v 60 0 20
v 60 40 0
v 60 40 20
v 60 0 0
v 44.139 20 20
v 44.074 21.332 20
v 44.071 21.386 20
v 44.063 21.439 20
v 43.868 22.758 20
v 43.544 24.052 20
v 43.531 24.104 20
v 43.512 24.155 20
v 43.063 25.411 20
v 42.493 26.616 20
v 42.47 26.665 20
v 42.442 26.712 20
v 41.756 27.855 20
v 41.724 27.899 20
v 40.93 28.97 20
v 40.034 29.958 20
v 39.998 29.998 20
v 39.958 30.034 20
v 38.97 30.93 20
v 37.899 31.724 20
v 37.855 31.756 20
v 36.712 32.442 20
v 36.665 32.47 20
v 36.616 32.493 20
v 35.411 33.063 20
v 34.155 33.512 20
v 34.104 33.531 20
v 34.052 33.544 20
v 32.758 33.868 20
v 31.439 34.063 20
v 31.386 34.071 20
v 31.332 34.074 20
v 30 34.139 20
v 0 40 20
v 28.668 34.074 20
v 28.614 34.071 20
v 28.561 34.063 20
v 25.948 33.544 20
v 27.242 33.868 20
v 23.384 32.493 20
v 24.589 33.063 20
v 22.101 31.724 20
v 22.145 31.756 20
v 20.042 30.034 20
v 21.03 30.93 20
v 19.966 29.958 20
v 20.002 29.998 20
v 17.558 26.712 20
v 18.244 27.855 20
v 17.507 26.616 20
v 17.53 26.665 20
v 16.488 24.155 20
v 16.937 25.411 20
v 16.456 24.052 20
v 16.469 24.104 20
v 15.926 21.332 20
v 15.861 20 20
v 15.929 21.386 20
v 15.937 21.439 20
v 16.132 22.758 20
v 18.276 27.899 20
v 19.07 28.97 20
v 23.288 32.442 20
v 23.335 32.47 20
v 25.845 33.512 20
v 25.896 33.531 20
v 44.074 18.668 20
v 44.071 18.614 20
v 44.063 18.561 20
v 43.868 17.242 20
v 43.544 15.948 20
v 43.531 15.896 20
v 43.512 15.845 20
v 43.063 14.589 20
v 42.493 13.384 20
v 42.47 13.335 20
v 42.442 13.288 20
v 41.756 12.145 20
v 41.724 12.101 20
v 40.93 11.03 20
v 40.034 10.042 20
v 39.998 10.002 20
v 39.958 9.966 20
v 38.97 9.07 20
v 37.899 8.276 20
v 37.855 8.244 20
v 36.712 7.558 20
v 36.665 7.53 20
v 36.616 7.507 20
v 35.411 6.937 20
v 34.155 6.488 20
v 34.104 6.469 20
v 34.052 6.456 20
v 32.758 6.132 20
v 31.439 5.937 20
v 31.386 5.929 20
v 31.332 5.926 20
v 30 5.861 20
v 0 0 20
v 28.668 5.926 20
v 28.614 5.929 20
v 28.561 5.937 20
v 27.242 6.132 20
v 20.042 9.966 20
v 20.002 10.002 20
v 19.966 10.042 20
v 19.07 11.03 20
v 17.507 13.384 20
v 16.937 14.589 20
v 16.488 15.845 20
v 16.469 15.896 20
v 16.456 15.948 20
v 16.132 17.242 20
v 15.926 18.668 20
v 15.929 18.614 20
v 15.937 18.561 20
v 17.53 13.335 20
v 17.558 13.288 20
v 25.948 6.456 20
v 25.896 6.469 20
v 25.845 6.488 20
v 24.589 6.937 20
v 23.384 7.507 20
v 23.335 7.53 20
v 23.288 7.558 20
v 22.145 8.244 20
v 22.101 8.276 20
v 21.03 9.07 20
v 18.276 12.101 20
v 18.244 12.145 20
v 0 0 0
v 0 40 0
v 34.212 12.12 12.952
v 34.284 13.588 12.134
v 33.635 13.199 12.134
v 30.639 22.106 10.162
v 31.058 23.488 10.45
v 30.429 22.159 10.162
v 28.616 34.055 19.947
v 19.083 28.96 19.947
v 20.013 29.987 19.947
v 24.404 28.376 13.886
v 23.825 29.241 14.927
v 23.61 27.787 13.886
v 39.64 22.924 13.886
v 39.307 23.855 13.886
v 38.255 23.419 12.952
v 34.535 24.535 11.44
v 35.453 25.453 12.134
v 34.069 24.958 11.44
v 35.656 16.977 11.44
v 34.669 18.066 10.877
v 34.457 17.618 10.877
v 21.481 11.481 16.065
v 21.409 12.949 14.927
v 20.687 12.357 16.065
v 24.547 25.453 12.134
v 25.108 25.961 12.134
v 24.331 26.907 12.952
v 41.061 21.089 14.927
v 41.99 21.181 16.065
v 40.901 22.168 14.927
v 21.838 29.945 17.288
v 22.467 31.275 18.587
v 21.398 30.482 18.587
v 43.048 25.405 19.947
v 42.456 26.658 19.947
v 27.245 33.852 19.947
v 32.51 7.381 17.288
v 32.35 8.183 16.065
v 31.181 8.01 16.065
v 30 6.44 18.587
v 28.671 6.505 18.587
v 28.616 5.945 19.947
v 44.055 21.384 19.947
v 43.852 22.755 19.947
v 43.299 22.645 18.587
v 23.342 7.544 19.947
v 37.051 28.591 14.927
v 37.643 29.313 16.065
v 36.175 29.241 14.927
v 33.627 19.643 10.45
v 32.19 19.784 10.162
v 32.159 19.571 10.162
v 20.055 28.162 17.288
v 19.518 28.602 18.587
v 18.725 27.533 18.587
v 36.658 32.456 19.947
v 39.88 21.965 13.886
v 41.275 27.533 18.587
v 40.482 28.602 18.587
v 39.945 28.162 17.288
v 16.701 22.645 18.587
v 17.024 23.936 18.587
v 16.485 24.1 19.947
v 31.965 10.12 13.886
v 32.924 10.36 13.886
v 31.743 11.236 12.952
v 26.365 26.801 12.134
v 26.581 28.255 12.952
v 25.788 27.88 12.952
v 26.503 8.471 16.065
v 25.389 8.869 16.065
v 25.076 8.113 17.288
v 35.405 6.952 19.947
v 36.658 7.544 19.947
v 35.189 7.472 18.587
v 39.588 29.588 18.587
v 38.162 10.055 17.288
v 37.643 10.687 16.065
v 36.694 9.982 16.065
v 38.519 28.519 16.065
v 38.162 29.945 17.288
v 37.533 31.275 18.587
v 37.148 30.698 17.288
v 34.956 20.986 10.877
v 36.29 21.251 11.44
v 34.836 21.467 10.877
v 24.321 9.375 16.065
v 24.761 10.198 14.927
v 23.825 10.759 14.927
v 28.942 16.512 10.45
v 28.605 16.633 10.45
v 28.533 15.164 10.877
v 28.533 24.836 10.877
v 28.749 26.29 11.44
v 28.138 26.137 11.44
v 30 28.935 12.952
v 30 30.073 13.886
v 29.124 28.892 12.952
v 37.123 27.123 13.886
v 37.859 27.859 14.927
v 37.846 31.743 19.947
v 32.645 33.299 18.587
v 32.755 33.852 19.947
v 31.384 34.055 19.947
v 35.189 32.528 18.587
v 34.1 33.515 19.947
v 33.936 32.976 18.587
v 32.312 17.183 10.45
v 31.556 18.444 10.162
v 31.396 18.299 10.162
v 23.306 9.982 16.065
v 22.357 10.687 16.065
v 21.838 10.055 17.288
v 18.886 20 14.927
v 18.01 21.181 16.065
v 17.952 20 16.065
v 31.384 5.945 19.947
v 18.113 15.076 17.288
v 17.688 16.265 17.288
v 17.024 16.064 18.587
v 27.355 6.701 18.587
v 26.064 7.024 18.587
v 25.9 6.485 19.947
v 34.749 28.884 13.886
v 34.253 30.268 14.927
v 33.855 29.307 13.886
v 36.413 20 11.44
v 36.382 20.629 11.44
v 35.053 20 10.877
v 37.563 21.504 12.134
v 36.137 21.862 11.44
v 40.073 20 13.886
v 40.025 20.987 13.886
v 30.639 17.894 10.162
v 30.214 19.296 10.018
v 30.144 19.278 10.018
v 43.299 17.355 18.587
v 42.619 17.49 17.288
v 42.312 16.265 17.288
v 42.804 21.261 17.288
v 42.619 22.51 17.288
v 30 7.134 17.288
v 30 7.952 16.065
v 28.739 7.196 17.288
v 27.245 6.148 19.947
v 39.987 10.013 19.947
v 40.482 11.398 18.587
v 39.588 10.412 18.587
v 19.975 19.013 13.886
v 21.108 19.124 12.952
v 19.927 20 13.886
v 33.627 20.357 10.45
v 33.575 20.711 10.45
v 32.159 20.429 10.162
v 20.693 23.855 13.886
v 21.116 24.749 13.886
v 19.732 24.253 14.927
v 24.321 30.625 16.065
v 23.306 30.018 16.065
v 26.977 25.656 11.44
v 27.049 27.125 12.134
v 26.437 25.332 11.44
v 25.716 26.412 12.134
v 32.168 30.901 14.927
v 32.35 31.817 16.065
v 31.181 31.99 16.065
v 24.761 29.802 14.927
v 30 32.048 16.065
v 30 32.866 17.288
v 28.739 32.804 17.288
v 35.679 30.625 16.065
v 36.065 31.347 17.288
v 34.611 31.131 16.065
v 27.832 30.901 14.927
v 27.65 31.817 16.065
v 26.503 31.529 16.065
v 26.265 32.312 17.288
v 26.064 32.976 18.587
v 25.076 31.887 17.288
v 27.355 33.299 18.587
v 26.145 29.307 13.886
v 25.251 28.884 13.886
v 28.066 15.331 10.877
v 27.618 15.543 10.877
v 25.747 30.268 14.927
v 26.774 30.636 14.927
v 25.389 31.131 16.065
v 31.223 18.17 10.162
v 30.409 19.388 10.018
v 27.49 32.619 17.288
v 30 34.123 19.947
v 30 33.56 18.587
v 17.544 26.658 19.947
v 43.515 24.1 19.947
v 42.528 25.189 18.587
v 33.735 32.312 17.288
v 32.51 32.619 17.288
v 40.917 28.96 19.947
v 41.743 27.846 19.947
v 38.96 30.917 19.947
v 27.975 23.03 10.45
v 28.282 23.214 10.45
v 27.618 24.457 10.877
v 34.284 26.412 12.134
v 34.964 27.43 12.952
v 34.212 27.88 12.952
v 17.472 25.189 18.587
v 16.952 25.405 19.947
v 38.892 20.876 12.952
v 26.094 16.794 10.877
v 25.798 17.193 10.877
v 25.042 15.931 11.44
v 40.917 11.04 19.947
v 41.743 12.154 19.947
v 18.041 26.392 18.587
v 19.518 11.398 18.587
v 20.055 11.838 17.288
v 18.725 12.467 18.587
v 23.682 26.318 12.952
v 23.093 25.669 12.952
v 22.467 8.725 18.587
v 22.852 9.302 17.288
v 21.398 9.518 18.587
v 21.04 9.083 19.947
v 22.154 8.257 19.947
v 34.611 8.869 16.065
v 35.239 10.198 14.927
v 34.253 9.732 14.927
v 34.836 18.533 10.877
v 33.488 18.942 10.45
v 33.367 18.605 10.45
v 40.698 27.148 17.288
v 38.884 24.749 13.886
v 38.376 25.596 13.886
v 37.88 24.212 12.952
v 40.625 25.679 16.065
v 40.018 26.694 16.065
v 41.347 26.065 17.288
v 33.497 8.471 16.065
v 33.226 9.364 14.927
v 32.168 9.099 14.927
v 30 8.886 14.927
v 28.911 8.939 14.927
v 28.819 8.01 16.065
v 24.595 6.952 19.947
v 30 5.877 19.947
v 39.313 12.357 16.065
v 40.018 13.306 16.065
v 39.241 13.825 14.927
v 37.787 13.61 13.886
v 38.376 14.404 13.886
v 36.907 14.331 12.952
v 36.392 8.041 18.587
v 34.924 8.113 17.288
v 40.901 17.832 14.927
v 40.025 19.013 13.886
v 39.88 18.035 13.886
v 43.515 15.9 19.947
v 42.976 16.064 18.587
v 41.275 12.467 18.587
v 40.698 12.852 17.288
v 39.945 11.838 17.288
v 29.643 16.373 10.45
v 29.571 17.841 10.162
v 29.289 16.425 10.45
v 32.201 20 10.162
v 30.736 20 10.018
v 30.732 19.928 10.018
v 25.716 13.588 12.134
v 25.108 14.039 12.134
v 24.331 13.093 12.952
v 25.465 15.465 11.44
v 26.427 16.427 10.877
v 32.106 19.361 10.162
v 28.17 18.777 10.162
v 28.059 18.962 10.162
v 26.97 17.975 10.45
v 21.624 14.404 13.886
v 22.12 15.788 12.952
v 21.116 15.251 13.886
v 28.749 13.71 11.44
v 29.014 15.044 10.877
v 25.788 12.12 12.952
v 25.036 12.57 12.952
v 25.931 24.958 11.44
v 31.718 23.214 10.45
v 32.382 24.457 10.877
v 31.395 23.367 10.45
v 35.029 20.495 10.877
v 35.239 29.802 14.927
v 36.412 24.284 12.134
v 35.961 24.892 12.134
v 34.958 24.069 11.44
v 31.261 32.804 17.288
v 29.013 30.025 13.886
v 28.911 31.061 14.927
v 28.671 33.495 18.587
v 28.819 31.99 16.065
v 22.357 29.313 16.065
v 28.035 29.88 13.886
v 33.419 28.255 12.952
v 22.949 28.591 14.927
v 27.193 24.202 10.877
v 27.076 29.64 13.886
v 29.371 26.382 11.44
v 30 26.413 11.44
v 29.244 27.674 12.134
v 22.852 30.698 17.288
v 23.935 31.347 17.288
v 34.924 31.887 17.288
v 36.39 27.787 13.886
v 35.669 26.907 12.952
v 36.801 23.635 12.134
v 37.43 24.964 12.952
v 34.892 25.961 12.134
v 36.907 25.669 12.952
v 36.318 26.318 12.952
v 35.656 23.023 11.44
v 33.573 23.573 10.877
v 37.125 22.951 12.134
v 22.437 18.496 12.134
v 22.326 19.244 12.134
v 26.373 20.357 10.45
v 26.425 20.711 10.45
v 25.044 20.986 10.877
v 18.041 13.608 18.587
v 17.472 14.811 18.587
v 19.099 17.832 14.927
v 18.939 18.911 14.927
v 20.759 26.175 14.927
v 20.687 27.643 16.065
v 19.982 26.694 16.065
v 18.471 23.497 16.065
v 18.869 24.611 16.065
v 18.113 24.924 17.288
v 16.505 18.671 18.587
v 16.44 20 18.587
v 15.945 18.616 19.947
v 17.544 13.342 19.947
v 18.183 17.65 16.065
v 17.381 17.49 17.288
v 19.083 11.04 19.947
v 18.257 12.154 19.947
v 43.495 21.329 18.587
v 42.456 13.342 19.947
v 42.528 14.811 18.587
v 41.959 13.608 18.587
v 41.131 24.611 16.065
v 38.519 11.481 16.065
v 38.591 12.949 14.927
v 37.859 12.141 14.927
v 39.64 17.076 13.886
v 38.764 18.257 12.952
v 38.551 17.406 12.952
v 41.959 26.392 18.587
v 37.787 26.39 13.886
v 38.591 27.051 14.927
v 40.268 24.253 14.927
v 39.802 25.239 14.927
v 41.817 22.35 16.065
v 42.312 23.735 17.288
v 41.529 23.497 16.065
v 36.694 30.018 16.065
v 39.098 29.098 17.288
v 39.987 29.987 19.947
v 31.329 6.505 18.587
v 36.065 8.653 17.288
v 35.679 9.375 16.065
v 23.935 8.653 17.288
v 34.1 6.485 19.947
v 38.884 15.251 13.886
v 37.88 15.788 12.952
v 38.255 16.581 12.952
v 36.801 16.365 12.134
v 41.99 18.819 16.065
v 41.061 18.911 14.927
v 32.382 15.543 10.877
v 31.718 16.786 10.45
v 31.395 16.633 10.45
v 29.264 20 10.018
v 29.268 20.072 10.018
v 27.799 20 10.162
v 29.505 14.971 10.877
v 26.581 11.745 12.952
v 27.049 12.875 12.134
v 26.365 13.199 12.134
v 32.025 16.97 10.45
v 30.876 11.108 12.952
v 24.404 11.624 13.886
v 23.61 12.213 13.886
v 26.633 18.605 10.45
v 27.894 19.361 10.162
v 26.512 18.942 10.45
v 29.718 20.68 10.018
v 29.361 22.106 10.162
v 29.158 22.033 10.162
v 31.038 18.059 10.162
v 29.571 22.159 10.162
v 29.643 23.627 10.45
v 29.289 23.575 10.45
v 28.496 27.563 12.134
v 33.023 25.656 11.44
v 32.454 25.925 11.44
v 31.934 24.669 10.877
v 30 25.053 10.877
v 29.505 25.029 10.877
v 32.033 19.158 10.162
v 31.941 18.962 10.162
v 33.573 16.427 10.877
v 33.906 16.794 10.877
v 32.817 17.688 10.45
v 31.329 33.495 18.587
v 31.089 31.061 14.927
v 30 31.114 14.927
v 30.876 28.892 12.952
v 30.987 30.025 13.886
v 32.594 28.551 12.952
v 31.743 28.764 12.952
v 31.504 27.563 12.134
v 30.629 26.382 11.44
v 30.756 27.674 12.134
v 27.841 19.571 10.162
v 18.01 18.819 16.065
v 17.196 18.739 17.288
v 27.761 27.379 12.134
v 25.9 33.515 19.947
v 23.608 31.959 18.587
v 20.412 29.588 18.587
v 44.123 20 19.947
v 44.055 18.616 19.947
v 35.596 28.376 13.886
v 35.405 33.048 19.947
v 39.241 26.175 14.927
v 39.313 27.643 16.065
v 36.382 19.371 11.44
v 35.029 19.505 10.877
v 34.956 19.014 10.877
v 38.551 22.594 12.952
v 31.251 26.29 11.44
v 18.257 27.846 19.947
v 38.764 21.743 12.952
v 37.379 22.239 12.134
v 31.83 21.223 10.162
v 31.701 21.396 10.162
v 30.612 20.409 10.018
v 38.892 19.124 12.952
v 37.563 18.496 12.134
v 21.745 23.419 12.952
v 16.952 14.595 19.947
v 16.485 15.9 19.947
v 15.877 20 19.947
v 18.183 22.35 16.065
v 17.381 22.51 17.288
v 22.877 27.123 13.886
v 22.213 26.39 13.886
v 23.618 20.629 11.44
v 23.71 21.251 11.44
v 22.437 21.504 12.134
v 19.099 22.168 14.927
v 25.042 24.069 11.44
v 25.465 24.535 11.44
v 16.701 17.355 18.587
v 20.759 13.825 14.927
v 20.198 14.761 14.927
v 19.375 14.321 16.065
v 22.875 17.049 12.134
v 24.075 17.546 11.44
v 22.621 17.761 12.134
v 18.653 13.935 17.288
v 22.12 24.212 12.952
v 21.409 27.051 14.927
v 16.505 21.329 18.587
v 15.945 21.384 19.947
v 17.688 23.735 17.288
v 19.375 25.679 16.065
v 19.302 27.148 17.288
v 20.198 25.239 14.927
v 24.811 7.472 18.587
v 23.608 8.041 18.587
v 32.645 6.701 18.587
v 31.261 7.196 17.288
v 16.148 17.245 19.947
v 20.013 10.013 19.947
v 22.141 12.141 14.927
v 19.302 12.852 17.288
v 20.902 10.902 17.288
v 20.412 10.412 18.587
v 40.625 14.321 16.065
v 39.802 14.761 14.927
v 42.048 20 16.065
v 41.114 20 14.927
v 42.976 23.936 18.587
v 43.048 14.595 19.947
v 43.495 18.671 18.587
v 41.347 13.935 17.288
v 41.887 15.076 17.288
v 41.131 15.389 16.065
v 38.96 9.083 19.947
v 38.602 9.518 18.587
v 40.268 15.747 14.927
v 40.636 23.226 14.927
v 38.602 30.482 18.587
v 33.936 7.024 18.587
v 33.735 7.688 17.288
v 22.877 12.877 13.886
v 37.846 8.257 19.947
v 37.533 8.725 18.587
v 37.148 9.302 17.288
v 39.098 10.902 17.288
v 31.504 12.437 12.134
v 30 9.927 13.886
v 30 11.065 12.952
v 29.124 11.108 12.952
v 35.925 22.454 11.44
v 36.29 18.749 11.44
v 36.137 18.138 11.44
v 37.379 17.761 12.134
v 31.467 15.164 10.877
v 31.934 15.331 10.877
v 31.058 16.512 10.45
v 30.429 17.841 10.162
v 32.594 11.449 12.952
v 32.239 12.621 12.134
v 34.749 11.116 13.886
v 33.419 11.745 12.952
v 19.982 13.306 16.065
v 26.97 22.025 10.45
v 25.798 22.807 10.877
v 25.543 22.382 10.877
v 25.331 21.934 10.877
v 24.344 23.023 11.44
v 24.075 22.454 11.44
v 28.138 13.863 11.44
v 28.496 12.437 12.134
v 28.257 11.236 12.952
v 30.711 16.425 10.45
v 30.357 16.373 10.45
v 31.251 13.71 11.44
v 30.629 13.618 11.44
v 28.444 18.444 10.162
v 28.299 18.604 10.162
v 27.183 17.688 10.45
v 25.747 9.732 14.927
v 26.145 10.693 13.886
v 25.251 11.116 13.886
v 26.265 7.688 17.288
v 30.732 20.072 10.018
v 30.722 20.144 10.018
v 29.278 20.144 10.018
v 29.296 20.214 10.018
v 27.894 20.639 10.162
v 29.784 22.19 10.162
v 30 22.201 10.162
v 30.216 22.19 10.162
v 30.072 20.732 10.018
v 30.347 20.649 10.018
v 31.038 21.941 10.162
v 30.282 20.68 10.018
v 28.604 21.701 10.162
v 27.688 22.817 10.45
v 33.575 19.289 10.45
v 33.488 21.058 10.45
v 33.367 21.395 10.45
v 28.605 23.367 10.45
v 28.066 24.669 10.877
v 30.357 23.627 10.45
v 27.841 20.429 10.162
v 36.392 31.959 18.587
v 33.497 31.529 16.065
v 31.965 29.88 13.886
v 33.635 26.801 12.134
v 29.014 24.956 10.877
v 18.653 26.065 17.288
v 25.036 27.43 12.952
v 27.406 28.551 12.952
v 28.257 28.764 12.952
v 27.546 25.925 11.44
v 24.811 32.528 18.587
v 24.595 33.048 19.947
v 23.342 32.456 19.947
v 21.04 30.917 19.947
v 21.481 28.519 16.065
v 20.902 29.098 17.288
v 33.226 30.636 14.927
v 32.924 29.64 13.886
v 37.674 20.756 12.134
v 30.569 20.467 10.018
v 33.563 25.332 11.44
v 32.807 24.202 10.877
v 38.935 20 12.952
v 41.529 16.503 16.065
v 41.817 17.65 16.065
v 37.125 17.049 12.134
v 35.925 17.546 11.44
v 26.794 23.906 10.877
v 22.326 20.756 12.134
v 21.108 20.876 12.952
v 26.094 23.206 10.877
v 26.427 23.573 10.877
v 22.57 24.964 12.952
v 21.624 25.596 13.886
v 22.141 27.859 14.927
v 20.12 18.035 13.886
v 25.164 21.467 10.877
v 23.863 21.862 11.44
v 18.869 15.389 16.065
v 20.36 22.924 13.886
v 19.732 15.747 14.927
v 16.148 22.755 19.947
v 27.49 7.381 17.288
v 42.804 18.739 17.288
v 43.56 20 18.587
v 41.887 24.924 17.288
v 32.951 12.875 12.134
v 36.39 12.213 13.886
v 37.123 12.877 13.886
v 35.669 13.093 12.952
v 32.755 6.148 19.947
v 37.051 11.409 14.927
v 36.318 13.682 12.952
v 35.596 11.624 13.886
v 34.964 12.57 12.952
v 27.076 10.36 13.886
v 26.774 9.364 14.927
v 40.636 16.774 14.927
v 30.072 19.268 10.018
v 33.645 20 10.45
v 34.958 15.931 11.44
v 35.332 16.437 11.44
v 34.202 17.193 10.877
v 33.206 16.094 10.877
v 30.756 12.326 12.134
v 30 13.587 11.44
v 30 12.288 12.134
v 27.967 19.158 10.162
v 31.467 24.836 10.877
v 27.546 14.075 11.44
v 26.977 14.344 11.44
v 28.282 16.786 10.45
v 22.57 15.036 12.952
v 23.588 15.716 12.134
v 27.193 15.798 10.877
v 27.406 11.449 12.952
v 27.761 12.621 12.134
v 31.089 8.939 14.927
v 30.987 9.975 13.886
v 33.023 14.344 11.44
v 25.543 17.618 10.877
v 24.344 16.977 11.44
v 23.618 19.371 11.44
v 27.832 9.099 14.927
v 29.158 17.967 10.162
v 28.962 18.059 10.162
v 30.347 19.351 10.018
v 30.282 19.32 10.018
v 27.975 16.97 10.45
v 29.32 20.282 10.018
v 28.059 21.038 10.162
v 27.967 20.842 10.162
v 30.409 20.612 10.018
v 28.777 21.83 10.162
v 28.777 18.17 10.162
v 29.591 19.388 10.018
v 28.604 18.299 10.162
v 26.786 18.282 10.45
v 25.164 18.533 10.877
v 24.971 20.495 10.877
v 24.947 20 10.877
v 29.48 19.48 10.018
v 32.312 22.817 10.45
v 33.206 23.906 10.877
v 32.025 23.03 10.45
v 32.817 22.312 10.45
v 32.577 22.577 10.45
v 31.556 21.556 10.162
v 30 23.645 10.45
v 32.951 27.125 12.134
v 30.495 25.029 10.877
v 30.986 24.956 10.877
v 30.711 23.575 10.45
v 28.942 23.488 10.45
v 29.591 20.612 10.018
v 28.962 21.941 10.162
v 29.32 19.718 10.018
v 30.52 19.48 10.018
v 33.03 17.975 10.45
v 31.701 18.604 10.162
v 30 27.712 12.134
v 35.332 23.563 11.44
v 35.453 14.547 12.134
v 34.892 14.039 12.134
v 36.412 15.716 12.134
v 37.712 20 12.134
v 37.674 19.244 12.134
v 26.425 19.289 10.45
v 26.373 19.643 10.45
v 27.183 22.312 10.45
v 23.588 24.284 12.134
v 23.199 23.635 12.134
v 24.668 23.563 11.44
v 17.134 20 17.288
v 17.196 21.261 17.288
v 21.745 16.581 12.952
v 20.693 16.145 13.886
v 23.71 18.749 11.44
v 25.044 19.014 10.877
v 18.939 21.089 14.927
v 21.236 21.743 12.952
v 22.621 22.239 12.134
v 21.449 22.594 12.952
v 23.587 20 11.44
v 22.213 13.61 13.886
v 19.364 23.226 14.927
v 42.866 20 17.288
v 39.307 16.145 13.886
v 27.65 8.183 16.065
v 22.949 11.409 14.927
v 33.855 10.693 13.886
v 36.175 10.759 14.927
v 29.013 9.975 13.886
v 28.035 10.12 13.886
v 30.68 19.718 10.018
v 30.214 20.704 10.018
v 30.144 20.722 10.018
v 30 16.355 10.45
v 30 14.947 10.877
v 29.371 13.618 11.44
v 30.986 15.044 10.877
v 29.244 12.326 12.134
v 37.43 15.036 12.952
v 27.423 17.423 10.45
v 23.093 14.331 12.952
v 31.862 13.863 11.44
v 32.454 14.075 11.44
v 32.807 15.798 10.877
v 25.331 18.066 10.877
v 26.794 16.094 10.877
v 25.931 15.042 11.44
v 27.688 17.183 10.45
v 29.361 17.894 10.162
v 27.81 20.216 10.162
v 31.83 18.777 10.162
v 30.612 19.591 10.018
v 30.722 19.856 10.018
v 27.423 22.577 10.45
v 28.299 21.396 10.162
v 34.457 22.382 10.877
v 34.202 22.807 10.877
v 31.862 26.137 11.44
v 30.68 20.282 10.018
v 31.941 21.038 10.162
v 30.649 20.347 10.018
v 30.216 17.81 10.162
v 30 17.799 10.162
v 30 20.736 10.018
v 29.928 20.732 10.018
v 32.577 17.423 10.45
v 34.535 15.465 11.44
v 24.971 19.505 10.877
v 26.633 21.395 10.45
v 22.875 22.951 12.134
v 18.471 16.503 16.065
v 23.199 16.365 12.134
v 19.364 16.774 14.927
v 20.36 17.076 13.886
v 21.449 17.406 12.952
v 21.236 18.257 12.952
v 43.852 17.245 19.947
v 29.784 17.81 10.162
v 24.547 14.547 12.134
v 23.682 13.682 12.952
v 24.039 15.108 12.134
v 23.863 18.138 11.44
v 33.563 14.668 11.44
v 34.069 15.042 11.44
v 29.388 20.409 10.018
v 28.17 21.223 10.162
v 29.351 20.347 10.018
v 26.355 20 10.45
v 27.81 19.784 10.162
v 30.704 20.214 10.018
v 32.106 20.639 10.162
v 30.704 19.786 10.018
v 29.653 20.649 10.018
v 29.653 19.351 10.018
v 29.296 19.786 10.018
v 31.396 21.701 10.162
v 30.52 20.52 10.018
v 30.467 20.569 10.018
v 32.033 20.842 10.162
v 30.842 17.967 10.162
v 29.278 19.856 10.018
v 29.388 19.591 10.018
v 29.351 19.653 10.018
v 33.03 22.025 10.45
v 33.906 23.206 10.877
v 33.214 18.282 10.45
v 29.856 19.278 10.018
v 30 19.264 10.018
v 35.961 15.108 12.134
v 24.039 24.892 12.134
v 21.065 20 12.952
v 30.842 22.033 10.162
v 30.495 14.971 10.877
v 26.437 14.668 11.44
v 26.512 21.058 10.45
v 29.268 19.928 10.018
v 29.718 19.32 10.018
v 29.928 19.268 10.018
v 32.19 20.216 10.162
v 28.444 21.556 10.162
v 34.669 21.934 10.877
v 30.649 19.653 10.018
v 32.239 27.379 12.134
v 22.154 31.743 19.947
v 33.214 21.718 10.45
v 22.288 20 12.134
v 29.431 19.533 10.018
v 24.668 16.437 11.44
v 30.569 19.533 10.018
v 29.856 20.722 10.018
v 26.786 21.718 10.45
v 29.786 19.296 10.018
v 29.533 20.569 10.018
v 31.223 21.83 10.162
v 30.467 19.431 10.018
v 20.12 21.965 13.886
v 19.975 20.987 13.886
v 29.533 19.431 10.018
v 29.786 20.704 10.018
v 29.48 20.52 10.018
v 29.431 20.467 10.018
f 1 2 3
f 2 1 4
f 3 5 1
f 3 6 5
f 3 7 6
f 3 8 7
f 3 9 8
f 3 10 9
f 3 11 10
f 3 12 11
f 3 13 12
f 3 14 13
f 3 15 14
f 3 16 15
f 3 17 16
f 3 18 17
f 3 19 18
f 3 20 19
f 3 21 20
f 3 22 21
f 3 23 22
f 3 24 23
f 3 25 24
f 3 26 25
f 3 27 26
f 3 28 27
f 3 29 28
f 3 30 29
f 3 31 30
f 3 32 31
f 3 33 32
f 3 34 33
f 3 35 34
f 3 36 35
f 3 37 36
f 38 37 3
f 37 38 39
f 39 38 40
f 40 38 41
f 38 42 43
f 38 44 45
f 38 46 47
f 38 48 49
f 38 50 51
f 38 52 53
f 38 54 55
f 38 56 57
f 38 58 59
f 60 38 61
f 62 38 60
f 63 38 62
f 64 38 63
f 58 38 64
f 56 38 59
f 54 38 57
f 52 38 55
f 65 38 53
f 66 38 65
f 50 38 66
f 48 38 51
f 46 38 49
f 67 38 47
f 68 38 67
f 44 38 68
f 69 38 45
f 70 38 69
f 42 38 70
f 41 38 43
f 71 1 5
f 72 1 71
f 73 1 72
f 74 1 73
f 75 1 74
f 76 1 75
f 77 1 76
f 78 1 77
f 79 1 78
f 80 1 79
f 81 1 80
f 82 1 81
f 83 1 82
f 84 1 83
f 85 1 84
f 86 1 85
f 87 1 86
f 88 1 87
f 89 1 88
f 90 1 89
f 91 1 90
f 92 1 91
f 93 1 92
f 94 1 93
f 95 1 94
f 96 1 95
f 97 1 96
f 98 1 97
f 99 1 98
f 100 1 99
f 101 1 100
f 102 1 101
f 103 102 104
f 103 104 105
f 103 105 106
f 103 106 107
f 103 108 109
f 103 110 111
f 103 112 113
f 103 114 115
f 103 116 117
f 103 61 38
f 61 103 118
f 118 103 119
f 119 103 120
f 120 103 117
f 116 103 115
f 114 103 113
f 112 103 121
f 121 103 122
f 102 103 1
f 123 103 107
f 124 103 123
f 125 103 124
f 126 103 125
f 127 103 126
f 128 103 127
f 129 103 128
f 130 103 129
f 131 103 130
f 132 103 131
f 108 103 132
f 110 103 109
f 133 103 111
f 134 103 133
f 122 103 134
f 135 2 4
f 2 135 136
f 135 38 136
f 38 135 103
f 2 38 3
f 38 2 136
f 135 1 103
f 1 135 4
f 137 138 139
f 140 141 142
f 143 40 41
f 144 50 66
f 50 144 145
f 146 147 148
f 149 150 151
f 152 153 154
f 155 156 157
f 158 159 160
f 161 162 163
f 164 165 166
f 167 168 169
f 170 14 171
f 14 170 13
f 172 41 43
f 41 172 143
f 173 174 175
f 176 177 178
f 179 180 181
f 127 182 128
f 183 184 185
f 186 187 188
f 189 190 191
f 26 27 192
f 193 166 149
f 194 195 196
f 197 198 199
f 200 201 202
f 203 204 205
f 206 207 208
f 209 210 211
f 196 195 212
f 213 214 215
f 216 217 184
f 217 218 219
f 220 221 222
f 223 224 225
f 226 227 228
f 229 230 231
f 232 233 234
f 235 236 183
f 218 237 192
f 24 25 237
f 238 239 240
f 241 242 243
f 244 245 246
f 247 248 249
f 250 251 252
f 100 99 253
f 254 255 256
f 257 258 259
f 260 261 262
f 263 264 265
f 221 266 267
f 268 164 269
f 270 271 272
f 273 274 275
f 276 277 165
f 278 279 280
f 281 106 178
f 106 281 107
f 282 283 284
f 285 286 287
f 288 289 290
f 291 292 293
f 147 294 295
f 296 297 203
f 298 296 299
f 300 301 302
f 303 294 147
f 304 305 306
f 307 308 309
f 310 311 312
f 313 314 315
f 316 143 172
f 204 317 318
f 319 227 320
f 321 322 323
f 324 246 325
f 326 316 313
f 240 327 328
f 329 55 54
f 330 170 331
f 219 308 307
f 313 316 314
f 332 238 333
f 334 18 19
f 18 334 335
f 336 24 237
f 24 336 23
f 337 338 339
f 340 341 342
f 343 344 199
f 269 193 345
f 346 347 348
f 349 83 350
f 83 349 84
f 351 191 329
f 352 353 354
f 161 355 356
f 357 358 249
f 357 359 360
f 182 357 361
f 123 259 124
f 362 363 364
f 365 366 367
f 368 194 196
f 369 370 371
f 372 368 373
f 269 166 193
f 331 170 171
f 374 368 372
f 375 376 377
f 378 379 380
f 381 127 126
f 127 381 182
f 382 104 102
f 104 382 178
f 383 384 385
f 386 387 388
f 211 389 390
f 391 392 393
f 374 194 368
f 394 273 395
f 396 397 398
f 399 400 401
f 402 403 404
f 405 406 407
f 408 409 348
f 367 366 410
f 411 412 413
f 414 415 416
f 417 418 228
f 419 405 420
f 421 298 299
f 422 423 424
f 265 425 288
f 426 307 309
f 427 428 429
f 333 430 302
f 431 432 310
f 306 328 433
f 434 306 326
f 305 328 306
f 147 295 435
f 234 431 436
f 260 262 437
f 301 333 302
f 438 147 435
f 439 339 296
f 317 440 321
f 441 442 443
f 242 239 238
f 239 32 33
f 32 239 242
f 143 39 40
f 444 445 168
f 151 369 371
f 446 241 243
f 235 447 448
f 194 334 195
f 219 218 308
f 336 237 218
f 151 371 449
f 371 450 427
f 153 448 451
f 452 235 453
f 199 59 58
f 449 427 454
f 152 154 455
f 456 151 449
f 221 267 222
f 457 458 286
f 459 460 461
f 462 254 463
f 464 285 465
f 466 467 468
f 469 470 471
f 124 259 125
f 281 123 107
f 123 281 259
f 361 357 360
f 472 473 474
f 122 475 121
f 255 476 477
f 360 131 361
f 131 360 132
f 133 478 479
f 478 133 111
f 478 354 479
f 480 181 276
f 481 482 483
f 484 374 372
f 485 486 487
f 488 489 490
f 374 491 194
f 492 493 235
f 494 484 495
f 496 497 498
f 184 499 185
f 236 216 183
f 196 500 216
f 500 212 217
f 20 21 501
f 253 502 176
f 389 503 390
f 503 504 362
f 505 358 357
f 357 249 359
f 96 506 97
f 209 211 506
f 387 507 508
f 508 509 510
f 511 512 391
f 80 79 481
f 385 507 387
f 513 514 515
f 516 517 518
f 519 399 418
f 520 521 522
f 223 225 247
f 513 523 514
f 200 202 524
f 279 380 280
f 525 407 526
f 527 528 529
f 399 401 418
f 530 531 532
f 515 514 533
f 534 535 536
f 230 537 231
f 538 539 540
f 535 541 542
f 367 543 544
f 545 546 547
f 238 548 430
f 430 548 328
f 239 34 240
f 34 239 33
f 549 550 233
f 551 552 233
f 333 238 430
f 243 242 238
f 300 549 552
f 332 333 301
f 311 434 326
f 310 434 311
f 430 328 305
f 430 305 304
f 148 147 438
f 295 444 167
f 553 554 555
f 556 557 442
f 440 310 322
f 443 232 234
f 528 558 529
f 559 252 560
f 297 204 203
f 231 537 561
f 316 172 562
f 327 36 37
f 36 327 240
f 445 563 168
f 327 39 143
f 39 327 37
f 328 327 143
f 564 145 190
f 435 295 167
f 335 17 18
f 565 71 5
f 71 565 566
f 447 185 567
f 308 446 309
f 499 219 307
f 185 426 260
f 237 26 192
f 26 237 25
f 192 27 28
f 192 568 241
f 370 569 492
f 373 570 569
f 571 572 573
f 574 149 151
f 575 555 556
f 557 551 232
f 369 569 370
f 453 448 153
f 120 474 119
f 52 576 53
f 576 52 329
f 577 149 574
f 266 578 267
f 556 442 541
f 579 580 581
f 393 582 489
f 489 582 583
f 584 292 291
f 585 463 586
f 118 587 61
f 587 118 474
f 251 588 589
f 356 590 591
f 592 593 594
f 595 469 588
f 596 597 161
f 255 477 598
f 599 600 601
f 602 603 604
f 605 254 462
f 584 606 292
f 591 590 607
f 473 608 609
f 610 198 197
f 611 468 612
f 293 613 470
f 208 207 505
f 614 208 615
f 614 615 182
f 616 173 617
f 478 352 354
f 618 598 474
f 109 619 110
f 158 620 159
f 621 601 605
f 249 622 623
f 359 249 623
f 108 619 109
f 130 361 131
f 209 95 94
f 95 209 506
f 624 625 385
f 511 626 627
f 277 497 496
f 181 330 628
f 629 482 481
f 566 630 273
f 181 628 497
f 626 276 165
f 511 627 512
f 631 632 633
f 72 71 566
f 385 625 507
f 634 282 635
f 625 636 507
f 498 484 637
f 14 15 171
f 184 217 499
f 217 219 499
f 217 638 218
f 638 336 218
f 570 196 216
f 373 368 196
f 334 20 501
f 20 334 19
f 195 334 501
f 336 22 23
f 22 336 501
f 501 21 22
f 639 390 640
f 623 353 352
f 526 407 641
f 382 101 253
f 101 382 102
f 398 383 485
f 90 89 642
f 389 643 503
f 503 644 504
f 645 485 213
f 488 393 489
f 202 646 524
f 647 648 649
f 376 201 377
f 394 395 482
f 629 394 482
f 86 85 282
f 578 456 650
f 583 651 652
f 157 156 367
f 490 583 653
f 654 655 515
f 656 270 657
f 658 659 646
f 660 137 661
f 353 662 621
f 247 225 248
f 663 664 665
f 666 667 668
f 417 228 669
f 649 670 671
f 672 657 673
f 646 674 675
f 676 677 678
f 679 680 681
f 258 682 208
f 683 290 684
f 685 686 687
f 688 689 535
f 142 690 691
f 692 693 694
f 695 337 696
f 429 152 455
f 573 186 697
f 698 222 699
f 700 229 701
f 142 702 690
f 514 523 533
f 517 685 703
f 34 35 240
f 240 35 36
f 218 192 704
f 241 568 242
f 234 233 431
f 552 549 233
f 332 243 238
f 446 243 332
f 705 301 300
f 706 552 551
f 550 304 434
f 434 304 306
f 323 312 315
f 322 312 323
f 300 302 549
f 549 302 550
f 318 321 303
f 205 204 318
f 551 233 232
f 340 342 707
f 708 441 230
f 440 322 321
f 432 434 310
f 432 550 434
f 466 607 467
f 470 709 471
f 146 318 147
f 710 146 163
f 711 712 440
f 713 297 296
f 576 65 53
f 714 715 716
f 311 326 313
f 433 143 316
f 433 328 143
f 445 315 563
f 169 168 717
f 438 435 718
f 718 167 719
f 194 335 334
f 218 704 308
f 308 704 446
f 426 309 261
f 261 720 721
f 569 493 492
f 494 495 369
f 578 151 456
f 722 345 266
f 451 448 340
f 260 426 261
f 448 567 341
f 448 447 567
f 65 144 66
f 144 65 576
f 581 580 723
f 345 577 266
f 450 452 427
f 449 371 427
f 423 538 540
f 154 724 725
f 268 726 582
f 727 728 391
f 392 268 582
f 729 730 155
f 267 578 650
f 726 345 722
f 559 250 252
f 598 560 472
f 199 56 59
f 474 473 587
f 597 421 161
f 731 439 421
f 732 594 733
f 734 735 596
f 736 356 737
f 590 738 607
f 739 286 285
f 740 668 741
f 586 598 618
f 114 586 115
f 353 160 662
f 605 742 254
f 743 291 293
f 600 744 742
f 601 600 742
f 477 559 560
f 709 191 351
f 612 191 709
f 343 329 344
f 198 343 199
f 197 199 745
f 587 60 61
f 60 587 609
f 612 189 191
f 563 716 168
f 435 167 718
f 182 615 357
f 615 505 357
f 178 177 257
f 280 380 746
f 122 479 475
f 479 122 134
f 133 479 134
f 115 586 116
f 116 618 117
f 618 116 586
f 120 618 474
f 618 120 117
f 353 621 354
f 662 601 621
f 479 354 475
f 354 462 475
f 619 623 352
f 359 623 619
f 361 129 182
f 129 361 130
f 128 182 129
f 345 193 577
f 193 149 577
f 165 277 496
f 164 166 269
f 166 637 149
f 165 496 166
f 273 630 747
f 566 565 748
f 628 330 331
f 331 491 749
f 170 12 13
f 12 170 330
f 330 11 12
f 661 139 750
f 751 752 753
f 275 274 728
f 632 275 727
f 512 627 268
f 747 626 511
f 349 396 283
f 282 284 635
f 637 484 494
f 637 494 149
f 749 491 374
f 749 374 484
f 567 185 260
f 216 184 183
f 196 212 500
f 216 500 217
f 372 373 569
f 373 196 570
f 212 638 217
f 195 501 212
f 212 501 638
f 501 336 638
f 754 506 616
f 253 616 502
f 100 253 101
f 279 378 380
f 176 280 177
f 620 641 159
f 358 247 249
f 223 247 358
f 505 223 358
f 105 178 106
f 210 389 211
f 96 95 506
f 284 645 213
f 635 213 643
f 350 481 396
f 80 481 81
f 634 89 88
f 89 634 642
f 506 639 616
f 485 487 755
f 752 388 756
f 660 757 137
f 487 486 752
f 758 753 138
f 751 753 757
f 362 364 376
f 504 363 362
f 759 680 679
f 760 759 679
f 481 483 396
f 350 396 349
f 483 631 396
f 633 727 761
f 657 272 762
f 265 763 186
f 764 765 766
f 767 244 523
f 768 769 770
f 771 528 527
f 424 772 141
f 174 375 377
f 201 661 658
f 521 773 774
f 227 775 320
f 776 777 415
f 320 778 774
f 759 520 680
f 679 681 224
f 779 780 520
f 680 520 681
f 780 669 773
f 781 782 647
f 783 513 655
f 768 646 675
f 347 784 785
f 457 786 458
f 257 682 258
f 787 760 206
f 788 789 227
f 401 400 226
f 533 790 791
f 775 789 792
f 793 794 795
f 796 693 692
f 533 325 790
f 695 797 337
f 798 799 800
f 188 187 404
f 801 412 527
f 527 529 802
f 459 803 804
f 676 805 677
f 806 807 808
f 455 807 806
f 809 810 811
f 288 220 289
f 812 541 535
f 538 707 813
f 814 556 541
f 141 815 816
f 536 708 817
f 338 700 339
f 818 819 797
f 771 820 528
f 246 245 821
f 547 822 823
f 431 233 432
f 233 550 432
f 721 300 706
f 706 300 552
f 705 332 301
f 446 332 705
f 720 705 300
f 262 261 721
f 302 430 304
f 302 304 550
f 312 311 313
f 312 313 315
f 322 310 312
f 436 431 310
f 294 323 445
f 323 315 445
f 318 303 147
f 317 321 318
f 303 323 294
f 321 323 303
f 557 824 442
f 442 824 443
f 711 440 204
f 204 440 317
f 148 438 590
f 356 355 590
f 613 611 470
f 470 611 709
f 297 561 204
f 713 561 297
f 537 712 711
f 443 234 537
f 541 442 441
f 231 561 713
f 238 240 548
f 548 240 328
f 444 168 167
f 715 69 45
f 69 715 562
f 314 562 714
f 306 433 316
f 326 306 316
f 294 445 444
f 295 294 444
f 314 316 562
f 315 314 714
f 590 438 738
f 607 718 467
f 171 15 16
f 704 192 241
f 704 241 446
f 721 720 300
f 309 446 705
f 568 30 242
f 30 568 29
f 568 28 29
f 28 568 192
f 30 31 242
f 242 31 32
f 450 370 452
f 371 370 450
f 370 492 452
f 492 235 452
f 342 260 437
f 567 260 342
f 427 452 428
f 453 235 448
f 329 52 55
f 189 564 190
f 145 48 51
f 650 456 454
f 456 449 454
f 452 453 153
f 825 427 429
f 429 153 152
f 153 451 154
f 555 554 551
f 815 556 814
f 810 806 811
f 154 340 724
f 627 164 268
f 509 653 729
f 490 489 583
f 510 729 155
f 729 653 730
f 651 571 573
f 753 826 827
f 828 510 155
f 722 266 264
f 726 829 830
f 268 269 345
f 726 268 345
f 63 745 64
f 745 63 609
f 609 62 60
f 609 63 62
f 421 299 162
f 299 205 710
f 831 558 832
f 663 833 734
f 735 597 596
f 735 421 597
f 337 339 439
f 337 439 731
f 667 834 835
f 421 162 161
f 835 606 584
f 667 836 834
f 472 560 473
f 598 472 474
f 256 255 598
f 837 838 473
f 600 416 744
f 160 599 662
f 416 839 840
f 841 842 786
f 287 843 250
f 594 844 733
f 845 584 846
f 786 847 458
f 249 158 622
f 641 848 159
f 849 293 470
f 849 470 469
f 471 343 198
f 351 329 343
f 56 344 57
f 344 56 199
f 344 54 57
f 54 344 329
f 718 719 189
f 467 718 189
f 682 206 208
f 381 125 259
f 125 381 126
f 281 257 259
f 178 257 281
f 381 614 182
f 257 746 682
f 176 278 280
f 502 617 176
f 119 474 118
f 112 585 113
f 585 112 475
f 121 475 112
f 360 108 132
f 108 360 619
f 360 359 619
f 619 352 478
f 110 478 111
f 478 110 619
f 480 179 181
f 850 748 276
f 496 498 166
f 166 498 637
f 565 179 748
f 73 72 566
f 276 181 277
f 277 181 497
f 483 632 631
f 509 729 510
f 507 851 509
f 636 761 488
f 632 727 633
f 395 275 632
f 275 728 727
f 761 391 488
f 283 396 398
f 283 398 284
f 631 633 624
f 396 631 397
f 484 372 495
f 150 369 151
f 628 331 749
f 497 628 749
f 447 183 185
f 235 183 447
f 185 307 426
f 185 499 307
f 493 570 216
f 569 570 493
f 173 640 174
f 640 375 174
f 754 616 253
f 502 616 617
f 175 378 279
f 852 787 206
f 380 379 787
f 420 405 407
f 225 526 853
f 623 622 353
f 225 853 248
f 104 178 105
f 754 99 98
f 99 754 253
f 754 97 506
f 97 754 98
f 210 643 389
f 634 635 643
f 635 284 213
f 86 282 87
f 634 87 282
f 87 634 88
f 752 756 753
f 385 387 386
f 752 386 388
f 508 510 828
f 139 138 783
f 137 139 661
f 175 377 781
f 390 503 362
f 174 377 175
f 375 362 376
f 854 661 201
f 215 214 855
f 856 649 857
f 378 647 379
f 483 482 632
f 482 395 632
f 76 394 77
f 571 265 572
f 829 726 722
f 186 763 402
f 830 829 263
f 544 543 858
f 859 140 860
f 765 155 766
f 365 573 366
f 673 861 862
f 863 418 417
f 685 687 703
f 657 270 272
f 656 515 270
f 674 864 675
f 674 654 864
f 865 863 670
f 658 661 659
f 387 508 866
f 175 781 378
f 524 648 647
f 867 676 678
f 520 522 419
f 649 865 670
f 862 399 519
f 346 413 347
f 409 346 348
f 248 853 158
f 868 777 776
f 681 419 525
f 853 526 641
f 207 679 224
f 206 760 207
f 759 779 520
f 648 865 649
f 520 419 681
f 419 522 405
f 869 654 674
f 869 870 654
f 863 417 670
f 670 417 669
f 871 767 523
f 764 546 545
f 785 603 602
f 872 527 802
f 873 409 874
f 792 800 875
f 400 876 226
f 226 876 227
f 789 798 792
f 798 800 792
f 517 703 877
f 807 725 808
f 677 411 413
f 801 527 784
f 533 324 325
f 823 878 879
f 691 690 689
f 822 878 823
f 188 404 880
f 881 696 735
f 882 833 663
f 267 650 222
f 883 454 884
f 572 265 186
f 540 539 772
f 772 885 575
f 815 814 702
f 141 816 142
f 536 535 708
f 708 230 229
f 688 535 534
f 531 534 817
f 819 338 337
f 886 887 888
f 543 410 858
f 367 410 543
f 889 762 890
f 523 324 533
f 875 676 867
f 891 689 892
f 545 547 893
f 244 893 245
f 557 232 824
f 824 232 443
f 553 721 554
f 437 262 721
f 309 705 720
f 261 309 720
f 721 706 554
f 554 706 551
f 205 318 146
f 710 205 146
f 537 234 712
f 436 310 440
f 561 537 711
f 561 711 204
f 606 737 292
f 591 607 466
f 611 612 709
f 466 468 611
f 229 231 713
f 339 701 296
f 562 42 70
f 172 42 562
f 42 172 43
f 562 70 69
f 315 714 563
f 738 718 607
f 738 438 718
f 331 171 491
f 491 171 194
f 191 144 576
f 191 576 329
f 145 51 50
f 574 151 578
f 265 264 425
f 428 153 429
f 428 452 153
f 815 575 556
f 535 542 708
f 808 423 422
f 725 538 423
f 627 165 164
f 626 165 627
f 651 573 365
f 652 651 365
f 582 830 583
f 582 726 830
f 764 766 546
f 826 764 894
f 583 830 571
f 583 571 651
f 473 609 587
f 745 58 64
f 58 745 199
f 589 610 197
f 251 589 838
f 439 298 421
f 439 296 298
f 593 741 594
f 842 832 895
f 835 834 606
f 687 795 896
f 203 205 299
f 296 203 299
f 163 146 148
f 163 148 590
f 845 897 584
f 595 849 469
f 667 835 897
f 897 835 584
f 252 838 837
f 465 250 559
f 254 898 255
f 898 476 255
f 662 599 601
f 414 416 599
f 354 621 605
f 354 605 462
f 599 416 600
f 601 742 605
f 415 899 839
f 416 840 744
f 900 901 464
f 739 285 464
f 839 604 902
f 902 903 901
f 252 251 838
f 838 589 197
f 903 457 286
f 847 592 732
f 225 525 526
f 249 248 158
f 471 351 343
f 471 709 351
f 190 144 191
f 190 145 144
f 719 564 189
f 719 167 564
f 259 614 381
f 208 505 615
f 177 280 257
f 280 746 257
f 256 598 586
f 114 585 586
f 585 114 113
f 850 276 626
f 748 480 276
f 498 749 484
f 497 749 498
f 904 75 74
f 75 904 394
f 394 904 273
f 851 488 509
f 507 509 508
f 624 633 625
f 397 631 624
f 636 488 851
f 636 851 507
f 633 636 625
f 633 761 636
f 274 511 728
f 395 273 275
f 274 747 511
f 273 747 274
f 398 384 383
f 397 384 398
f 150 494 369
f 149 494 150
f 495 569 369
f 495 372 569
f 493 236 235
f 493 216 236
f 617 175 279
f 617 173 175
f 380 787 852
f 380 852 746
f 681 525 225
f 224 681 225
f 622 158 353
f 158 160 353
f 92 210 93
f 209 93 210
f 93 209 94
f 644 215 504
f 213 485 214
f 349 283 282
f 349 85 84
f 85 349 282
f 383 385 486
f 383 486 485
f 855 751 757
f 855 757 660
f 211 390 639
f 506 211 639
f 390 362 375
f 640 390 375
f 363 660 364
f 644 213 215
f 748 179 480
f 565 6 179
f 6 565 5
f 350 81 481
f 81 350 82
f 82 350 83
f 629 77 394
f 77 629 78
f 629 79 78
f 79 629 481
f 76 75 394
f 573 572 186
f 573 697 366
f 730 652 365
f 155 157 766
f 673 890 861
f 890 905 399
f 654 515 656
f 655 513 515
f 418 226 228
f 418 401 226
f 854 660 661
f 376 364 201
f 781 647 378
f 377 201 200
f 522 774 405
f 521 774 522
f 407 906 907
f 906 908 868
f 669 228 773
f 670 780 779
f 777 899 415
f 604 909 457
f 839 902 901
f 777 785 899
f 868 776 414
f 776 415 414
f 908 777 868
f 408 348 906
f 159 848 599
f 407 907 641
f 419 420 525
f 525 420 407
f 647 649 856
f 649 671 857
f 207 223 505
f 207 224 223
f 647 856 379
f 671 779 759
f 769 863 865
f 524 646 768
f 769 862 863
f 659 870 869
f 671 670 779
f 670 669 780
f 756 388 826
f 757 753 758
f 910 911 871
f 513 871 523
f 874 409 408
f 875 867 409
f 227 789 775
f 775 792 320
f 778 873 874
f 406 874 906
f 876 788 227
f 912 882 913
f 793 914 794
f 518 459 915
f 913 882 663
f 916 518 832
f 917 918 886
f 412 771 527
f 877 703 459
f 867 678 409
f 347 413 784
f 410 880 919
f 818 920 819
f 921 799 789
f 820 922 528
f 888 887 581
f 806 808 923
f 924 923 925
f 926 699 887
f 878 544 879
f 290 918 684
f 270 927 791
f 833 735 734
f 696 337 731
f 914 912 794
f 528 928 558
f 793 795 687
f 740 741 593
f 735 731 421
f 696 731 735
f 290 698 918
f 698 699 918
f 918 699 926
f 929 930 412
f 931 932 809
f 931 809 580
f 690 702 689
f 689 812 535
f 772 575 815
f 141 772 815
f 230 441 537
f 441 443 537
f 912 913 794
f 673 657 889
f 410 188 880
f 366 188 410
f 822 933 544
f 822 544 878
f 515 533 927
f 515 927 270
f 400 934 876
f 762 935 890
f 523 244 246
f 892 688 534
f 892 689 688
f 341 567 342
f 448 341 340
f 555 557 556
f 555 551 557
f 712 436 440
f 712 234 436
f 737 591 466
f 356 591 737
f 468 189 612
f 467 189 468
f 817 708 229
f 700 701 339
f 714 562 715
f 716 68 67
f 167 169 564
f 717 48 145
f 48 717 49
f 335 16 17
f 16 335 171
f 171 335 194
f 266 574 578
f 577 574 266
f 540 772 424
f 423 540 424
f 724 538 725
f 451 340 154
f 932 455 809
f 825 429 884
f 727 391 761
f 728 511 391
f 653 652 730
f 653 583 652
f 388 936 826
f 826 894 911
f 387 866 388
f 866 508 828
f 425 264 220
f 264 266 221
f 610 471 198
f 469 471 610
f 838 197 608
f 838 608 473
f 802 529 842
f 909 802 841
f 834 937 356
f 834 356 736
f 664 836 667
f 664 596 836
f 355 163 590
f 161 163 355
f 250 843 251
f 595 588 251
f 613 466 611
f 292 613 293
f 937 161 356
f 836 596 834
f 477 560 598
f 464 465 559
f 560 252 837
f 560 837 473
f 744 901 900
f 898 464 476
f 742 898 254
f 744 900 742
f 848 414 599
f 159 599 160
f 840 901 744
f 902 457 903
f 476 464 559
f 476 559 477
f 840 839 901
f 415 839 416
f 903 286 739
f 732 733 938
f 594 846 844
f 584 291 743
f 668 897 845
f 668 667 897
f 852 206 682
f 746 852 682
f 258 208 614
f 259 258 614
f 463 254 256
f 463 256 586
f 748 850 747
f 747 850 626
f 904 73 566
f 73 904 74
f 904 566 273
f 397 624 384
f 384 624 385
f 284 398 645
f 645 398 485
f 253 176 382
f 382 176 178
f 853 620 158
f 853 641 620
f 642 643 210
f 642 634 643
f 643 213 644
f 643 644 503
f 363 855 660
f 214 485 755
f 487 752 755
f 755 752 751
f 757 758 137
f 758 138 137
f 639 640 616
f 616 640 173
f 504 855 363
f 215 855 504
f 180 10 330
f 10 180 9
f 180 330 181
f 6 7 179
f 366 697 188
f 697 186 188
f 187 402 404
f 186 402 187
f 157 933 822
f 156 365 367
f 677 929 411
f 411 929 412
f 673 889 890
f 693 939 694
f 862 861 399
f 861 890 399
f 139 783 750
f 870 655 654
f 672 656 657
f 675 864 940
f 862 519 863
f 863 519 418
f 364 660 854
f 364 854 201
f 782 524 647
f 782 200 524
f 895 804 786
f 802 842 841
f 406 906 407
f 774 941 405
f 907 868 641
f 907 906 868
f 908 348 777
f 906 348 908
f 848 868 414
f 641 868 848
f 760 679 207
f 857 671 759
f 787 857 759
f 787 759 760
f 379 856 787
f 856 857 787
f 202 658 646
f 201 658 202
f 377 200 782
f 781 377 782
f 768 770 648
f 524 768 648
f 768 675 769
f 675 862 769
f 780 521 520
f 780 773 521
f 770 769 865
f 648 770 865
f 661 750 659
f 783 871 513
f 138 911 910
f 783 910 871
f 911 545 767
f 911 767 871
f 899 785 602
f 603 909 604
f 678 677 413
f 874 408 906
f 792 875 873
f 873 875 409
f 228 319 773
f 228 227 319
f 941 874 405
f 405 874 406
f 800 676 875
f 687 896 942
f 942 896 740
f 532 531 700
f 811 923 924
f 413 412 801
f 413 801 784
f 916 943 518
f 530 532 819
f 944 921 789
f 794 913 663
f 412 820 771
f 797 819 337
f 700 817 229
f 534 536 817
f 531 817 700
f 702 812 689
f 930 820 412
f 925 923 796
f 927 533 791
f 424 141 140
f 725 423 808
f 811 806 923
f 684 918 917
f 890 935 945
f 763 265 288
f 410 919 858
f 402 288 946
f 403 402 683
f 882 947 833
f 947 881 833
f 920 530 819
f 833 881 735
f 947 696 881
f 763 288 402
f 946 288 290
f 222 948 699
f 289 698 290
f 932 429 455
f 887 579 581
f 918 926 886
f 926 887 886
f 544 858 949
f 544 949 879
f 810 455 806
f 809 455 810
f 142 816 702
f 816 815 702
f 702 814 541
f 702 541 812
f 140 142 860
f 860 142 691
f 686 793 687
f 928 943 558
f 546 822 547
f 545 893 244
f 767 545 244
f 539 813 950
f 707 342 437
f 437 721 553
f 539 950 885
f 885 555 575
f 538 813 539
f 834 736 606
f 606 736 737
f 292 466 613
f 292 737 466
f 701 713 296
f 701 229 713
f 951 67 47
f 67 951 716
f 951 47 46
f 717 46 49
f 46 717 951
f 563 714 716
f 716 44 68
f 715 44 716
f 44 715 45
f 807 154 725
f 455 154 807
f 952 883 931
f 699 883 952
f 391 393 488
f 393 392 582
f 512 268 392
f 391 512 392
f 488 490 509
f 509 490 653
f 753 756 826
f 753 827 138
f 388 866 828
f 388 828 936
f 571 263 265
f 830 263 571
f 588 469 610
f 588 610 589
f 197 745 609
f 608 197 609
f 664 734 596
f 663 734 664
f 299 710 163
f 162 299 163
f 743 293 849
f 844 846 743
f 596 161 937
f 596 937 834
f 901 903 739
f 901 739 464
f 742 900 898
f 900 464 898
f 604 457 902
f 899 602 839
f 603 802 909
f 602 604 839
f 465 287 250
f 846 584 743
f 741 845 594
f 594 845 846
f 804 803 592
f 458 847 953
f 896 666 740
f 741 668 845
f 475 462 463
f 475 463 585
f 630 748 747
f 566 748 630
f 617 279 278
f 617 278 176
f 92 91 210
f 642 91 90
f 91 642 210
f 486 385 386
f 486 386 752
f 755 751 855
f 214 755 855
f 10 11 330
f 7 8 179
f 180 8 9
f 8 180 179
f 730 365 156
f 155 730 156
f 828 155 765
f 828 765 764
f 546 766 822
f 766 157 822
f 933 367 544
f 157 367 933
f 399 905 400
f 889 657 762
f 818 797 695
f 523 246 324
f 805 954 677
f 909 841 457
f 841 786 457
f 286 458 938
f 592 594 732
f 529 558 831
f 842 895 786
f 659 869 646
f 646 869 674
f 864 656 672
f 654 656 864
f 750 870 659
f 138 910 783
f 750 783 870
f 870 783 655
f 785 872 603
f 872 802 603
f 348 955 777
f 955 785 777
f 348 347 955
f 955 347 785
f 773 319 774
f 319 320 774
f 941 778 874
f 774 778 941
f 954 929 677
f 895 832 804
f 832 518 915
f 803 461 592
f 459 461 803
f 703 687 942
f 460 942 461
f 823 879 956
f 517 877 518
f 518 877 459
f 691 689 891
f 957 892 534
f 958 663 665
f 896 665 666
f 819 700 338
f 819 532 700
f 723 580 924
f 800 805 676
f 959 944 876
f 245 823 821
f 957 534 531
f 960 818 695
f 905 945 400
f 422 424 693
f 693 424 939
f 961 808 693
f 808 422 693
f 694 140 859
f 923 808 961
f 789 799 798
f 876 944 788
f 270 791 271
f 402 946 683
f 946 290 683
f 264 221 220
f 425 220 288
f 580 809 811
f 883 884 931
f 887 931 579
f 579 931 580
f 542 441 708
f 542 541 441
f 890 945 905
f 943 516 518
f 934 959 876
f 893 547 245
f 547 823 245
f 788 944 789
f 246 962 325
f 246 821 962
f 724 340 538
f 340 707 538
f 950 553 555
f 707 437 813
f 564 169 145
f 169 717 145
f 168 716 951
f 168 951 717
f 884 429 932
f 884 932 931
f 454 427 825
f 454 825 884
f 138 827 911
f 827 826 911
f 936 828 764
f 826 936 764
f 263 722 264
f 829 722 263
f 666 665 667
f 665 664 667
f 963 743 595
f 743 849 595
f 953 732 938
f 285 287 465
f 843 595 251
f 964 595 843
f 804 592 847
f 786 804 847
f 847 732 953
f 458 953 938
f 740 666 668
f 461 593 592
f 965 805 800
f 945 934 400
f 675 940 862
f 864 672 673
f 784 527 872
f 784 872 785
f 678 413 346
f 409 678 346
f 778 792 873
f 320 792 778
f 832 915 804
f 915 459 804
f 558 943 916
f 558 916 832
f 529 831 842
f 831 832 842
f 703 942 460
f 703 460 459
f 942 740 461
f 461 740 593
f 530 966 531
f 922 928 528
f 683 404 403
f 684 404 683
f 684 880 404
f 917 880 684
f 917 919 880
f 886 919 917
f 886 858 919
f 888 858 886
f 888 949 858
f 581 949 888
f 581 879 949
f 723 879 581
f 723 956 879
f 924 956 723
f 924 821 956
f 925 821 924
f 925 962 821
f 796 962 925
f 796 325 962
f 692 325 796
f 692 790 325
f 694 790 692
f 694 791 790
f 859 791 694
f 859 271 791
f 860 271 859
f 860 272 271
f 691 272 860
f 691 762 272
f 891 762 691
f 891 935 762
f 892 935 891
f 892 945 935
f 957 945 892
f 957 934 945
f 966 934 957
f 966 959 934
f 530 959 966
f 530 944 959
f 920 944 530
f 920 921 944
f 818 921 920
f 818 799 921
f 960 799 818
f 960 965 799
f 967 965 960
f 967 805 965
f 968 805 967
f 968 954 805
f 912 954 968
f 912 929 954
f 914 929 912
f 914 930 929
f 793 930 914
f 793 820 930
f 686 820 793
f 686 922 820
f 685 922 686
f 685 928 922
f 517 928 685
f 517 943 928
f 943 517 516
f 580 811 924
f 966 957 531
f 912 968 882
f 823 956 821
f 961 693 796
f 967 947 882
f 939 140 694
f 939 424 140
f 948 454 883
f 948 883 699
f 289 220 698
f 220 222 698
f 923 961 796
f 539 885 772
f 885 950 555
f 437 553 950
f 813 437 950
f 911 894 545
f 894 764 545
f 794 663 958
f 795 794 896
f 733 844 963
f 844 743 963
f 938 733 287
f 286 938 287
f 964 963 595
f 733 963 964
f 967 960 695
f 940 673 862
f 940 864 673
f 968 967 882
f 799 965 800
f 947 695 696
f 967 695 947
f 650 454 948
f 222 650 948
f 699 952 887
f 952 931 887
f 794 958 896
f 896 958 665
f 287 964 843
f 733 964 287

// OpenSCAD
// Block with a spherical cut-out. Rendered and inspected with OpenSCAD 2021.01.
$fn = 64;
block = [60, 40, 20];
sphere_d = 30;

difference() {
    cube(block);
    translate([block[0]/2, block[1]/2, block[2] + 5]) sphere(d = sphere_d);
}
